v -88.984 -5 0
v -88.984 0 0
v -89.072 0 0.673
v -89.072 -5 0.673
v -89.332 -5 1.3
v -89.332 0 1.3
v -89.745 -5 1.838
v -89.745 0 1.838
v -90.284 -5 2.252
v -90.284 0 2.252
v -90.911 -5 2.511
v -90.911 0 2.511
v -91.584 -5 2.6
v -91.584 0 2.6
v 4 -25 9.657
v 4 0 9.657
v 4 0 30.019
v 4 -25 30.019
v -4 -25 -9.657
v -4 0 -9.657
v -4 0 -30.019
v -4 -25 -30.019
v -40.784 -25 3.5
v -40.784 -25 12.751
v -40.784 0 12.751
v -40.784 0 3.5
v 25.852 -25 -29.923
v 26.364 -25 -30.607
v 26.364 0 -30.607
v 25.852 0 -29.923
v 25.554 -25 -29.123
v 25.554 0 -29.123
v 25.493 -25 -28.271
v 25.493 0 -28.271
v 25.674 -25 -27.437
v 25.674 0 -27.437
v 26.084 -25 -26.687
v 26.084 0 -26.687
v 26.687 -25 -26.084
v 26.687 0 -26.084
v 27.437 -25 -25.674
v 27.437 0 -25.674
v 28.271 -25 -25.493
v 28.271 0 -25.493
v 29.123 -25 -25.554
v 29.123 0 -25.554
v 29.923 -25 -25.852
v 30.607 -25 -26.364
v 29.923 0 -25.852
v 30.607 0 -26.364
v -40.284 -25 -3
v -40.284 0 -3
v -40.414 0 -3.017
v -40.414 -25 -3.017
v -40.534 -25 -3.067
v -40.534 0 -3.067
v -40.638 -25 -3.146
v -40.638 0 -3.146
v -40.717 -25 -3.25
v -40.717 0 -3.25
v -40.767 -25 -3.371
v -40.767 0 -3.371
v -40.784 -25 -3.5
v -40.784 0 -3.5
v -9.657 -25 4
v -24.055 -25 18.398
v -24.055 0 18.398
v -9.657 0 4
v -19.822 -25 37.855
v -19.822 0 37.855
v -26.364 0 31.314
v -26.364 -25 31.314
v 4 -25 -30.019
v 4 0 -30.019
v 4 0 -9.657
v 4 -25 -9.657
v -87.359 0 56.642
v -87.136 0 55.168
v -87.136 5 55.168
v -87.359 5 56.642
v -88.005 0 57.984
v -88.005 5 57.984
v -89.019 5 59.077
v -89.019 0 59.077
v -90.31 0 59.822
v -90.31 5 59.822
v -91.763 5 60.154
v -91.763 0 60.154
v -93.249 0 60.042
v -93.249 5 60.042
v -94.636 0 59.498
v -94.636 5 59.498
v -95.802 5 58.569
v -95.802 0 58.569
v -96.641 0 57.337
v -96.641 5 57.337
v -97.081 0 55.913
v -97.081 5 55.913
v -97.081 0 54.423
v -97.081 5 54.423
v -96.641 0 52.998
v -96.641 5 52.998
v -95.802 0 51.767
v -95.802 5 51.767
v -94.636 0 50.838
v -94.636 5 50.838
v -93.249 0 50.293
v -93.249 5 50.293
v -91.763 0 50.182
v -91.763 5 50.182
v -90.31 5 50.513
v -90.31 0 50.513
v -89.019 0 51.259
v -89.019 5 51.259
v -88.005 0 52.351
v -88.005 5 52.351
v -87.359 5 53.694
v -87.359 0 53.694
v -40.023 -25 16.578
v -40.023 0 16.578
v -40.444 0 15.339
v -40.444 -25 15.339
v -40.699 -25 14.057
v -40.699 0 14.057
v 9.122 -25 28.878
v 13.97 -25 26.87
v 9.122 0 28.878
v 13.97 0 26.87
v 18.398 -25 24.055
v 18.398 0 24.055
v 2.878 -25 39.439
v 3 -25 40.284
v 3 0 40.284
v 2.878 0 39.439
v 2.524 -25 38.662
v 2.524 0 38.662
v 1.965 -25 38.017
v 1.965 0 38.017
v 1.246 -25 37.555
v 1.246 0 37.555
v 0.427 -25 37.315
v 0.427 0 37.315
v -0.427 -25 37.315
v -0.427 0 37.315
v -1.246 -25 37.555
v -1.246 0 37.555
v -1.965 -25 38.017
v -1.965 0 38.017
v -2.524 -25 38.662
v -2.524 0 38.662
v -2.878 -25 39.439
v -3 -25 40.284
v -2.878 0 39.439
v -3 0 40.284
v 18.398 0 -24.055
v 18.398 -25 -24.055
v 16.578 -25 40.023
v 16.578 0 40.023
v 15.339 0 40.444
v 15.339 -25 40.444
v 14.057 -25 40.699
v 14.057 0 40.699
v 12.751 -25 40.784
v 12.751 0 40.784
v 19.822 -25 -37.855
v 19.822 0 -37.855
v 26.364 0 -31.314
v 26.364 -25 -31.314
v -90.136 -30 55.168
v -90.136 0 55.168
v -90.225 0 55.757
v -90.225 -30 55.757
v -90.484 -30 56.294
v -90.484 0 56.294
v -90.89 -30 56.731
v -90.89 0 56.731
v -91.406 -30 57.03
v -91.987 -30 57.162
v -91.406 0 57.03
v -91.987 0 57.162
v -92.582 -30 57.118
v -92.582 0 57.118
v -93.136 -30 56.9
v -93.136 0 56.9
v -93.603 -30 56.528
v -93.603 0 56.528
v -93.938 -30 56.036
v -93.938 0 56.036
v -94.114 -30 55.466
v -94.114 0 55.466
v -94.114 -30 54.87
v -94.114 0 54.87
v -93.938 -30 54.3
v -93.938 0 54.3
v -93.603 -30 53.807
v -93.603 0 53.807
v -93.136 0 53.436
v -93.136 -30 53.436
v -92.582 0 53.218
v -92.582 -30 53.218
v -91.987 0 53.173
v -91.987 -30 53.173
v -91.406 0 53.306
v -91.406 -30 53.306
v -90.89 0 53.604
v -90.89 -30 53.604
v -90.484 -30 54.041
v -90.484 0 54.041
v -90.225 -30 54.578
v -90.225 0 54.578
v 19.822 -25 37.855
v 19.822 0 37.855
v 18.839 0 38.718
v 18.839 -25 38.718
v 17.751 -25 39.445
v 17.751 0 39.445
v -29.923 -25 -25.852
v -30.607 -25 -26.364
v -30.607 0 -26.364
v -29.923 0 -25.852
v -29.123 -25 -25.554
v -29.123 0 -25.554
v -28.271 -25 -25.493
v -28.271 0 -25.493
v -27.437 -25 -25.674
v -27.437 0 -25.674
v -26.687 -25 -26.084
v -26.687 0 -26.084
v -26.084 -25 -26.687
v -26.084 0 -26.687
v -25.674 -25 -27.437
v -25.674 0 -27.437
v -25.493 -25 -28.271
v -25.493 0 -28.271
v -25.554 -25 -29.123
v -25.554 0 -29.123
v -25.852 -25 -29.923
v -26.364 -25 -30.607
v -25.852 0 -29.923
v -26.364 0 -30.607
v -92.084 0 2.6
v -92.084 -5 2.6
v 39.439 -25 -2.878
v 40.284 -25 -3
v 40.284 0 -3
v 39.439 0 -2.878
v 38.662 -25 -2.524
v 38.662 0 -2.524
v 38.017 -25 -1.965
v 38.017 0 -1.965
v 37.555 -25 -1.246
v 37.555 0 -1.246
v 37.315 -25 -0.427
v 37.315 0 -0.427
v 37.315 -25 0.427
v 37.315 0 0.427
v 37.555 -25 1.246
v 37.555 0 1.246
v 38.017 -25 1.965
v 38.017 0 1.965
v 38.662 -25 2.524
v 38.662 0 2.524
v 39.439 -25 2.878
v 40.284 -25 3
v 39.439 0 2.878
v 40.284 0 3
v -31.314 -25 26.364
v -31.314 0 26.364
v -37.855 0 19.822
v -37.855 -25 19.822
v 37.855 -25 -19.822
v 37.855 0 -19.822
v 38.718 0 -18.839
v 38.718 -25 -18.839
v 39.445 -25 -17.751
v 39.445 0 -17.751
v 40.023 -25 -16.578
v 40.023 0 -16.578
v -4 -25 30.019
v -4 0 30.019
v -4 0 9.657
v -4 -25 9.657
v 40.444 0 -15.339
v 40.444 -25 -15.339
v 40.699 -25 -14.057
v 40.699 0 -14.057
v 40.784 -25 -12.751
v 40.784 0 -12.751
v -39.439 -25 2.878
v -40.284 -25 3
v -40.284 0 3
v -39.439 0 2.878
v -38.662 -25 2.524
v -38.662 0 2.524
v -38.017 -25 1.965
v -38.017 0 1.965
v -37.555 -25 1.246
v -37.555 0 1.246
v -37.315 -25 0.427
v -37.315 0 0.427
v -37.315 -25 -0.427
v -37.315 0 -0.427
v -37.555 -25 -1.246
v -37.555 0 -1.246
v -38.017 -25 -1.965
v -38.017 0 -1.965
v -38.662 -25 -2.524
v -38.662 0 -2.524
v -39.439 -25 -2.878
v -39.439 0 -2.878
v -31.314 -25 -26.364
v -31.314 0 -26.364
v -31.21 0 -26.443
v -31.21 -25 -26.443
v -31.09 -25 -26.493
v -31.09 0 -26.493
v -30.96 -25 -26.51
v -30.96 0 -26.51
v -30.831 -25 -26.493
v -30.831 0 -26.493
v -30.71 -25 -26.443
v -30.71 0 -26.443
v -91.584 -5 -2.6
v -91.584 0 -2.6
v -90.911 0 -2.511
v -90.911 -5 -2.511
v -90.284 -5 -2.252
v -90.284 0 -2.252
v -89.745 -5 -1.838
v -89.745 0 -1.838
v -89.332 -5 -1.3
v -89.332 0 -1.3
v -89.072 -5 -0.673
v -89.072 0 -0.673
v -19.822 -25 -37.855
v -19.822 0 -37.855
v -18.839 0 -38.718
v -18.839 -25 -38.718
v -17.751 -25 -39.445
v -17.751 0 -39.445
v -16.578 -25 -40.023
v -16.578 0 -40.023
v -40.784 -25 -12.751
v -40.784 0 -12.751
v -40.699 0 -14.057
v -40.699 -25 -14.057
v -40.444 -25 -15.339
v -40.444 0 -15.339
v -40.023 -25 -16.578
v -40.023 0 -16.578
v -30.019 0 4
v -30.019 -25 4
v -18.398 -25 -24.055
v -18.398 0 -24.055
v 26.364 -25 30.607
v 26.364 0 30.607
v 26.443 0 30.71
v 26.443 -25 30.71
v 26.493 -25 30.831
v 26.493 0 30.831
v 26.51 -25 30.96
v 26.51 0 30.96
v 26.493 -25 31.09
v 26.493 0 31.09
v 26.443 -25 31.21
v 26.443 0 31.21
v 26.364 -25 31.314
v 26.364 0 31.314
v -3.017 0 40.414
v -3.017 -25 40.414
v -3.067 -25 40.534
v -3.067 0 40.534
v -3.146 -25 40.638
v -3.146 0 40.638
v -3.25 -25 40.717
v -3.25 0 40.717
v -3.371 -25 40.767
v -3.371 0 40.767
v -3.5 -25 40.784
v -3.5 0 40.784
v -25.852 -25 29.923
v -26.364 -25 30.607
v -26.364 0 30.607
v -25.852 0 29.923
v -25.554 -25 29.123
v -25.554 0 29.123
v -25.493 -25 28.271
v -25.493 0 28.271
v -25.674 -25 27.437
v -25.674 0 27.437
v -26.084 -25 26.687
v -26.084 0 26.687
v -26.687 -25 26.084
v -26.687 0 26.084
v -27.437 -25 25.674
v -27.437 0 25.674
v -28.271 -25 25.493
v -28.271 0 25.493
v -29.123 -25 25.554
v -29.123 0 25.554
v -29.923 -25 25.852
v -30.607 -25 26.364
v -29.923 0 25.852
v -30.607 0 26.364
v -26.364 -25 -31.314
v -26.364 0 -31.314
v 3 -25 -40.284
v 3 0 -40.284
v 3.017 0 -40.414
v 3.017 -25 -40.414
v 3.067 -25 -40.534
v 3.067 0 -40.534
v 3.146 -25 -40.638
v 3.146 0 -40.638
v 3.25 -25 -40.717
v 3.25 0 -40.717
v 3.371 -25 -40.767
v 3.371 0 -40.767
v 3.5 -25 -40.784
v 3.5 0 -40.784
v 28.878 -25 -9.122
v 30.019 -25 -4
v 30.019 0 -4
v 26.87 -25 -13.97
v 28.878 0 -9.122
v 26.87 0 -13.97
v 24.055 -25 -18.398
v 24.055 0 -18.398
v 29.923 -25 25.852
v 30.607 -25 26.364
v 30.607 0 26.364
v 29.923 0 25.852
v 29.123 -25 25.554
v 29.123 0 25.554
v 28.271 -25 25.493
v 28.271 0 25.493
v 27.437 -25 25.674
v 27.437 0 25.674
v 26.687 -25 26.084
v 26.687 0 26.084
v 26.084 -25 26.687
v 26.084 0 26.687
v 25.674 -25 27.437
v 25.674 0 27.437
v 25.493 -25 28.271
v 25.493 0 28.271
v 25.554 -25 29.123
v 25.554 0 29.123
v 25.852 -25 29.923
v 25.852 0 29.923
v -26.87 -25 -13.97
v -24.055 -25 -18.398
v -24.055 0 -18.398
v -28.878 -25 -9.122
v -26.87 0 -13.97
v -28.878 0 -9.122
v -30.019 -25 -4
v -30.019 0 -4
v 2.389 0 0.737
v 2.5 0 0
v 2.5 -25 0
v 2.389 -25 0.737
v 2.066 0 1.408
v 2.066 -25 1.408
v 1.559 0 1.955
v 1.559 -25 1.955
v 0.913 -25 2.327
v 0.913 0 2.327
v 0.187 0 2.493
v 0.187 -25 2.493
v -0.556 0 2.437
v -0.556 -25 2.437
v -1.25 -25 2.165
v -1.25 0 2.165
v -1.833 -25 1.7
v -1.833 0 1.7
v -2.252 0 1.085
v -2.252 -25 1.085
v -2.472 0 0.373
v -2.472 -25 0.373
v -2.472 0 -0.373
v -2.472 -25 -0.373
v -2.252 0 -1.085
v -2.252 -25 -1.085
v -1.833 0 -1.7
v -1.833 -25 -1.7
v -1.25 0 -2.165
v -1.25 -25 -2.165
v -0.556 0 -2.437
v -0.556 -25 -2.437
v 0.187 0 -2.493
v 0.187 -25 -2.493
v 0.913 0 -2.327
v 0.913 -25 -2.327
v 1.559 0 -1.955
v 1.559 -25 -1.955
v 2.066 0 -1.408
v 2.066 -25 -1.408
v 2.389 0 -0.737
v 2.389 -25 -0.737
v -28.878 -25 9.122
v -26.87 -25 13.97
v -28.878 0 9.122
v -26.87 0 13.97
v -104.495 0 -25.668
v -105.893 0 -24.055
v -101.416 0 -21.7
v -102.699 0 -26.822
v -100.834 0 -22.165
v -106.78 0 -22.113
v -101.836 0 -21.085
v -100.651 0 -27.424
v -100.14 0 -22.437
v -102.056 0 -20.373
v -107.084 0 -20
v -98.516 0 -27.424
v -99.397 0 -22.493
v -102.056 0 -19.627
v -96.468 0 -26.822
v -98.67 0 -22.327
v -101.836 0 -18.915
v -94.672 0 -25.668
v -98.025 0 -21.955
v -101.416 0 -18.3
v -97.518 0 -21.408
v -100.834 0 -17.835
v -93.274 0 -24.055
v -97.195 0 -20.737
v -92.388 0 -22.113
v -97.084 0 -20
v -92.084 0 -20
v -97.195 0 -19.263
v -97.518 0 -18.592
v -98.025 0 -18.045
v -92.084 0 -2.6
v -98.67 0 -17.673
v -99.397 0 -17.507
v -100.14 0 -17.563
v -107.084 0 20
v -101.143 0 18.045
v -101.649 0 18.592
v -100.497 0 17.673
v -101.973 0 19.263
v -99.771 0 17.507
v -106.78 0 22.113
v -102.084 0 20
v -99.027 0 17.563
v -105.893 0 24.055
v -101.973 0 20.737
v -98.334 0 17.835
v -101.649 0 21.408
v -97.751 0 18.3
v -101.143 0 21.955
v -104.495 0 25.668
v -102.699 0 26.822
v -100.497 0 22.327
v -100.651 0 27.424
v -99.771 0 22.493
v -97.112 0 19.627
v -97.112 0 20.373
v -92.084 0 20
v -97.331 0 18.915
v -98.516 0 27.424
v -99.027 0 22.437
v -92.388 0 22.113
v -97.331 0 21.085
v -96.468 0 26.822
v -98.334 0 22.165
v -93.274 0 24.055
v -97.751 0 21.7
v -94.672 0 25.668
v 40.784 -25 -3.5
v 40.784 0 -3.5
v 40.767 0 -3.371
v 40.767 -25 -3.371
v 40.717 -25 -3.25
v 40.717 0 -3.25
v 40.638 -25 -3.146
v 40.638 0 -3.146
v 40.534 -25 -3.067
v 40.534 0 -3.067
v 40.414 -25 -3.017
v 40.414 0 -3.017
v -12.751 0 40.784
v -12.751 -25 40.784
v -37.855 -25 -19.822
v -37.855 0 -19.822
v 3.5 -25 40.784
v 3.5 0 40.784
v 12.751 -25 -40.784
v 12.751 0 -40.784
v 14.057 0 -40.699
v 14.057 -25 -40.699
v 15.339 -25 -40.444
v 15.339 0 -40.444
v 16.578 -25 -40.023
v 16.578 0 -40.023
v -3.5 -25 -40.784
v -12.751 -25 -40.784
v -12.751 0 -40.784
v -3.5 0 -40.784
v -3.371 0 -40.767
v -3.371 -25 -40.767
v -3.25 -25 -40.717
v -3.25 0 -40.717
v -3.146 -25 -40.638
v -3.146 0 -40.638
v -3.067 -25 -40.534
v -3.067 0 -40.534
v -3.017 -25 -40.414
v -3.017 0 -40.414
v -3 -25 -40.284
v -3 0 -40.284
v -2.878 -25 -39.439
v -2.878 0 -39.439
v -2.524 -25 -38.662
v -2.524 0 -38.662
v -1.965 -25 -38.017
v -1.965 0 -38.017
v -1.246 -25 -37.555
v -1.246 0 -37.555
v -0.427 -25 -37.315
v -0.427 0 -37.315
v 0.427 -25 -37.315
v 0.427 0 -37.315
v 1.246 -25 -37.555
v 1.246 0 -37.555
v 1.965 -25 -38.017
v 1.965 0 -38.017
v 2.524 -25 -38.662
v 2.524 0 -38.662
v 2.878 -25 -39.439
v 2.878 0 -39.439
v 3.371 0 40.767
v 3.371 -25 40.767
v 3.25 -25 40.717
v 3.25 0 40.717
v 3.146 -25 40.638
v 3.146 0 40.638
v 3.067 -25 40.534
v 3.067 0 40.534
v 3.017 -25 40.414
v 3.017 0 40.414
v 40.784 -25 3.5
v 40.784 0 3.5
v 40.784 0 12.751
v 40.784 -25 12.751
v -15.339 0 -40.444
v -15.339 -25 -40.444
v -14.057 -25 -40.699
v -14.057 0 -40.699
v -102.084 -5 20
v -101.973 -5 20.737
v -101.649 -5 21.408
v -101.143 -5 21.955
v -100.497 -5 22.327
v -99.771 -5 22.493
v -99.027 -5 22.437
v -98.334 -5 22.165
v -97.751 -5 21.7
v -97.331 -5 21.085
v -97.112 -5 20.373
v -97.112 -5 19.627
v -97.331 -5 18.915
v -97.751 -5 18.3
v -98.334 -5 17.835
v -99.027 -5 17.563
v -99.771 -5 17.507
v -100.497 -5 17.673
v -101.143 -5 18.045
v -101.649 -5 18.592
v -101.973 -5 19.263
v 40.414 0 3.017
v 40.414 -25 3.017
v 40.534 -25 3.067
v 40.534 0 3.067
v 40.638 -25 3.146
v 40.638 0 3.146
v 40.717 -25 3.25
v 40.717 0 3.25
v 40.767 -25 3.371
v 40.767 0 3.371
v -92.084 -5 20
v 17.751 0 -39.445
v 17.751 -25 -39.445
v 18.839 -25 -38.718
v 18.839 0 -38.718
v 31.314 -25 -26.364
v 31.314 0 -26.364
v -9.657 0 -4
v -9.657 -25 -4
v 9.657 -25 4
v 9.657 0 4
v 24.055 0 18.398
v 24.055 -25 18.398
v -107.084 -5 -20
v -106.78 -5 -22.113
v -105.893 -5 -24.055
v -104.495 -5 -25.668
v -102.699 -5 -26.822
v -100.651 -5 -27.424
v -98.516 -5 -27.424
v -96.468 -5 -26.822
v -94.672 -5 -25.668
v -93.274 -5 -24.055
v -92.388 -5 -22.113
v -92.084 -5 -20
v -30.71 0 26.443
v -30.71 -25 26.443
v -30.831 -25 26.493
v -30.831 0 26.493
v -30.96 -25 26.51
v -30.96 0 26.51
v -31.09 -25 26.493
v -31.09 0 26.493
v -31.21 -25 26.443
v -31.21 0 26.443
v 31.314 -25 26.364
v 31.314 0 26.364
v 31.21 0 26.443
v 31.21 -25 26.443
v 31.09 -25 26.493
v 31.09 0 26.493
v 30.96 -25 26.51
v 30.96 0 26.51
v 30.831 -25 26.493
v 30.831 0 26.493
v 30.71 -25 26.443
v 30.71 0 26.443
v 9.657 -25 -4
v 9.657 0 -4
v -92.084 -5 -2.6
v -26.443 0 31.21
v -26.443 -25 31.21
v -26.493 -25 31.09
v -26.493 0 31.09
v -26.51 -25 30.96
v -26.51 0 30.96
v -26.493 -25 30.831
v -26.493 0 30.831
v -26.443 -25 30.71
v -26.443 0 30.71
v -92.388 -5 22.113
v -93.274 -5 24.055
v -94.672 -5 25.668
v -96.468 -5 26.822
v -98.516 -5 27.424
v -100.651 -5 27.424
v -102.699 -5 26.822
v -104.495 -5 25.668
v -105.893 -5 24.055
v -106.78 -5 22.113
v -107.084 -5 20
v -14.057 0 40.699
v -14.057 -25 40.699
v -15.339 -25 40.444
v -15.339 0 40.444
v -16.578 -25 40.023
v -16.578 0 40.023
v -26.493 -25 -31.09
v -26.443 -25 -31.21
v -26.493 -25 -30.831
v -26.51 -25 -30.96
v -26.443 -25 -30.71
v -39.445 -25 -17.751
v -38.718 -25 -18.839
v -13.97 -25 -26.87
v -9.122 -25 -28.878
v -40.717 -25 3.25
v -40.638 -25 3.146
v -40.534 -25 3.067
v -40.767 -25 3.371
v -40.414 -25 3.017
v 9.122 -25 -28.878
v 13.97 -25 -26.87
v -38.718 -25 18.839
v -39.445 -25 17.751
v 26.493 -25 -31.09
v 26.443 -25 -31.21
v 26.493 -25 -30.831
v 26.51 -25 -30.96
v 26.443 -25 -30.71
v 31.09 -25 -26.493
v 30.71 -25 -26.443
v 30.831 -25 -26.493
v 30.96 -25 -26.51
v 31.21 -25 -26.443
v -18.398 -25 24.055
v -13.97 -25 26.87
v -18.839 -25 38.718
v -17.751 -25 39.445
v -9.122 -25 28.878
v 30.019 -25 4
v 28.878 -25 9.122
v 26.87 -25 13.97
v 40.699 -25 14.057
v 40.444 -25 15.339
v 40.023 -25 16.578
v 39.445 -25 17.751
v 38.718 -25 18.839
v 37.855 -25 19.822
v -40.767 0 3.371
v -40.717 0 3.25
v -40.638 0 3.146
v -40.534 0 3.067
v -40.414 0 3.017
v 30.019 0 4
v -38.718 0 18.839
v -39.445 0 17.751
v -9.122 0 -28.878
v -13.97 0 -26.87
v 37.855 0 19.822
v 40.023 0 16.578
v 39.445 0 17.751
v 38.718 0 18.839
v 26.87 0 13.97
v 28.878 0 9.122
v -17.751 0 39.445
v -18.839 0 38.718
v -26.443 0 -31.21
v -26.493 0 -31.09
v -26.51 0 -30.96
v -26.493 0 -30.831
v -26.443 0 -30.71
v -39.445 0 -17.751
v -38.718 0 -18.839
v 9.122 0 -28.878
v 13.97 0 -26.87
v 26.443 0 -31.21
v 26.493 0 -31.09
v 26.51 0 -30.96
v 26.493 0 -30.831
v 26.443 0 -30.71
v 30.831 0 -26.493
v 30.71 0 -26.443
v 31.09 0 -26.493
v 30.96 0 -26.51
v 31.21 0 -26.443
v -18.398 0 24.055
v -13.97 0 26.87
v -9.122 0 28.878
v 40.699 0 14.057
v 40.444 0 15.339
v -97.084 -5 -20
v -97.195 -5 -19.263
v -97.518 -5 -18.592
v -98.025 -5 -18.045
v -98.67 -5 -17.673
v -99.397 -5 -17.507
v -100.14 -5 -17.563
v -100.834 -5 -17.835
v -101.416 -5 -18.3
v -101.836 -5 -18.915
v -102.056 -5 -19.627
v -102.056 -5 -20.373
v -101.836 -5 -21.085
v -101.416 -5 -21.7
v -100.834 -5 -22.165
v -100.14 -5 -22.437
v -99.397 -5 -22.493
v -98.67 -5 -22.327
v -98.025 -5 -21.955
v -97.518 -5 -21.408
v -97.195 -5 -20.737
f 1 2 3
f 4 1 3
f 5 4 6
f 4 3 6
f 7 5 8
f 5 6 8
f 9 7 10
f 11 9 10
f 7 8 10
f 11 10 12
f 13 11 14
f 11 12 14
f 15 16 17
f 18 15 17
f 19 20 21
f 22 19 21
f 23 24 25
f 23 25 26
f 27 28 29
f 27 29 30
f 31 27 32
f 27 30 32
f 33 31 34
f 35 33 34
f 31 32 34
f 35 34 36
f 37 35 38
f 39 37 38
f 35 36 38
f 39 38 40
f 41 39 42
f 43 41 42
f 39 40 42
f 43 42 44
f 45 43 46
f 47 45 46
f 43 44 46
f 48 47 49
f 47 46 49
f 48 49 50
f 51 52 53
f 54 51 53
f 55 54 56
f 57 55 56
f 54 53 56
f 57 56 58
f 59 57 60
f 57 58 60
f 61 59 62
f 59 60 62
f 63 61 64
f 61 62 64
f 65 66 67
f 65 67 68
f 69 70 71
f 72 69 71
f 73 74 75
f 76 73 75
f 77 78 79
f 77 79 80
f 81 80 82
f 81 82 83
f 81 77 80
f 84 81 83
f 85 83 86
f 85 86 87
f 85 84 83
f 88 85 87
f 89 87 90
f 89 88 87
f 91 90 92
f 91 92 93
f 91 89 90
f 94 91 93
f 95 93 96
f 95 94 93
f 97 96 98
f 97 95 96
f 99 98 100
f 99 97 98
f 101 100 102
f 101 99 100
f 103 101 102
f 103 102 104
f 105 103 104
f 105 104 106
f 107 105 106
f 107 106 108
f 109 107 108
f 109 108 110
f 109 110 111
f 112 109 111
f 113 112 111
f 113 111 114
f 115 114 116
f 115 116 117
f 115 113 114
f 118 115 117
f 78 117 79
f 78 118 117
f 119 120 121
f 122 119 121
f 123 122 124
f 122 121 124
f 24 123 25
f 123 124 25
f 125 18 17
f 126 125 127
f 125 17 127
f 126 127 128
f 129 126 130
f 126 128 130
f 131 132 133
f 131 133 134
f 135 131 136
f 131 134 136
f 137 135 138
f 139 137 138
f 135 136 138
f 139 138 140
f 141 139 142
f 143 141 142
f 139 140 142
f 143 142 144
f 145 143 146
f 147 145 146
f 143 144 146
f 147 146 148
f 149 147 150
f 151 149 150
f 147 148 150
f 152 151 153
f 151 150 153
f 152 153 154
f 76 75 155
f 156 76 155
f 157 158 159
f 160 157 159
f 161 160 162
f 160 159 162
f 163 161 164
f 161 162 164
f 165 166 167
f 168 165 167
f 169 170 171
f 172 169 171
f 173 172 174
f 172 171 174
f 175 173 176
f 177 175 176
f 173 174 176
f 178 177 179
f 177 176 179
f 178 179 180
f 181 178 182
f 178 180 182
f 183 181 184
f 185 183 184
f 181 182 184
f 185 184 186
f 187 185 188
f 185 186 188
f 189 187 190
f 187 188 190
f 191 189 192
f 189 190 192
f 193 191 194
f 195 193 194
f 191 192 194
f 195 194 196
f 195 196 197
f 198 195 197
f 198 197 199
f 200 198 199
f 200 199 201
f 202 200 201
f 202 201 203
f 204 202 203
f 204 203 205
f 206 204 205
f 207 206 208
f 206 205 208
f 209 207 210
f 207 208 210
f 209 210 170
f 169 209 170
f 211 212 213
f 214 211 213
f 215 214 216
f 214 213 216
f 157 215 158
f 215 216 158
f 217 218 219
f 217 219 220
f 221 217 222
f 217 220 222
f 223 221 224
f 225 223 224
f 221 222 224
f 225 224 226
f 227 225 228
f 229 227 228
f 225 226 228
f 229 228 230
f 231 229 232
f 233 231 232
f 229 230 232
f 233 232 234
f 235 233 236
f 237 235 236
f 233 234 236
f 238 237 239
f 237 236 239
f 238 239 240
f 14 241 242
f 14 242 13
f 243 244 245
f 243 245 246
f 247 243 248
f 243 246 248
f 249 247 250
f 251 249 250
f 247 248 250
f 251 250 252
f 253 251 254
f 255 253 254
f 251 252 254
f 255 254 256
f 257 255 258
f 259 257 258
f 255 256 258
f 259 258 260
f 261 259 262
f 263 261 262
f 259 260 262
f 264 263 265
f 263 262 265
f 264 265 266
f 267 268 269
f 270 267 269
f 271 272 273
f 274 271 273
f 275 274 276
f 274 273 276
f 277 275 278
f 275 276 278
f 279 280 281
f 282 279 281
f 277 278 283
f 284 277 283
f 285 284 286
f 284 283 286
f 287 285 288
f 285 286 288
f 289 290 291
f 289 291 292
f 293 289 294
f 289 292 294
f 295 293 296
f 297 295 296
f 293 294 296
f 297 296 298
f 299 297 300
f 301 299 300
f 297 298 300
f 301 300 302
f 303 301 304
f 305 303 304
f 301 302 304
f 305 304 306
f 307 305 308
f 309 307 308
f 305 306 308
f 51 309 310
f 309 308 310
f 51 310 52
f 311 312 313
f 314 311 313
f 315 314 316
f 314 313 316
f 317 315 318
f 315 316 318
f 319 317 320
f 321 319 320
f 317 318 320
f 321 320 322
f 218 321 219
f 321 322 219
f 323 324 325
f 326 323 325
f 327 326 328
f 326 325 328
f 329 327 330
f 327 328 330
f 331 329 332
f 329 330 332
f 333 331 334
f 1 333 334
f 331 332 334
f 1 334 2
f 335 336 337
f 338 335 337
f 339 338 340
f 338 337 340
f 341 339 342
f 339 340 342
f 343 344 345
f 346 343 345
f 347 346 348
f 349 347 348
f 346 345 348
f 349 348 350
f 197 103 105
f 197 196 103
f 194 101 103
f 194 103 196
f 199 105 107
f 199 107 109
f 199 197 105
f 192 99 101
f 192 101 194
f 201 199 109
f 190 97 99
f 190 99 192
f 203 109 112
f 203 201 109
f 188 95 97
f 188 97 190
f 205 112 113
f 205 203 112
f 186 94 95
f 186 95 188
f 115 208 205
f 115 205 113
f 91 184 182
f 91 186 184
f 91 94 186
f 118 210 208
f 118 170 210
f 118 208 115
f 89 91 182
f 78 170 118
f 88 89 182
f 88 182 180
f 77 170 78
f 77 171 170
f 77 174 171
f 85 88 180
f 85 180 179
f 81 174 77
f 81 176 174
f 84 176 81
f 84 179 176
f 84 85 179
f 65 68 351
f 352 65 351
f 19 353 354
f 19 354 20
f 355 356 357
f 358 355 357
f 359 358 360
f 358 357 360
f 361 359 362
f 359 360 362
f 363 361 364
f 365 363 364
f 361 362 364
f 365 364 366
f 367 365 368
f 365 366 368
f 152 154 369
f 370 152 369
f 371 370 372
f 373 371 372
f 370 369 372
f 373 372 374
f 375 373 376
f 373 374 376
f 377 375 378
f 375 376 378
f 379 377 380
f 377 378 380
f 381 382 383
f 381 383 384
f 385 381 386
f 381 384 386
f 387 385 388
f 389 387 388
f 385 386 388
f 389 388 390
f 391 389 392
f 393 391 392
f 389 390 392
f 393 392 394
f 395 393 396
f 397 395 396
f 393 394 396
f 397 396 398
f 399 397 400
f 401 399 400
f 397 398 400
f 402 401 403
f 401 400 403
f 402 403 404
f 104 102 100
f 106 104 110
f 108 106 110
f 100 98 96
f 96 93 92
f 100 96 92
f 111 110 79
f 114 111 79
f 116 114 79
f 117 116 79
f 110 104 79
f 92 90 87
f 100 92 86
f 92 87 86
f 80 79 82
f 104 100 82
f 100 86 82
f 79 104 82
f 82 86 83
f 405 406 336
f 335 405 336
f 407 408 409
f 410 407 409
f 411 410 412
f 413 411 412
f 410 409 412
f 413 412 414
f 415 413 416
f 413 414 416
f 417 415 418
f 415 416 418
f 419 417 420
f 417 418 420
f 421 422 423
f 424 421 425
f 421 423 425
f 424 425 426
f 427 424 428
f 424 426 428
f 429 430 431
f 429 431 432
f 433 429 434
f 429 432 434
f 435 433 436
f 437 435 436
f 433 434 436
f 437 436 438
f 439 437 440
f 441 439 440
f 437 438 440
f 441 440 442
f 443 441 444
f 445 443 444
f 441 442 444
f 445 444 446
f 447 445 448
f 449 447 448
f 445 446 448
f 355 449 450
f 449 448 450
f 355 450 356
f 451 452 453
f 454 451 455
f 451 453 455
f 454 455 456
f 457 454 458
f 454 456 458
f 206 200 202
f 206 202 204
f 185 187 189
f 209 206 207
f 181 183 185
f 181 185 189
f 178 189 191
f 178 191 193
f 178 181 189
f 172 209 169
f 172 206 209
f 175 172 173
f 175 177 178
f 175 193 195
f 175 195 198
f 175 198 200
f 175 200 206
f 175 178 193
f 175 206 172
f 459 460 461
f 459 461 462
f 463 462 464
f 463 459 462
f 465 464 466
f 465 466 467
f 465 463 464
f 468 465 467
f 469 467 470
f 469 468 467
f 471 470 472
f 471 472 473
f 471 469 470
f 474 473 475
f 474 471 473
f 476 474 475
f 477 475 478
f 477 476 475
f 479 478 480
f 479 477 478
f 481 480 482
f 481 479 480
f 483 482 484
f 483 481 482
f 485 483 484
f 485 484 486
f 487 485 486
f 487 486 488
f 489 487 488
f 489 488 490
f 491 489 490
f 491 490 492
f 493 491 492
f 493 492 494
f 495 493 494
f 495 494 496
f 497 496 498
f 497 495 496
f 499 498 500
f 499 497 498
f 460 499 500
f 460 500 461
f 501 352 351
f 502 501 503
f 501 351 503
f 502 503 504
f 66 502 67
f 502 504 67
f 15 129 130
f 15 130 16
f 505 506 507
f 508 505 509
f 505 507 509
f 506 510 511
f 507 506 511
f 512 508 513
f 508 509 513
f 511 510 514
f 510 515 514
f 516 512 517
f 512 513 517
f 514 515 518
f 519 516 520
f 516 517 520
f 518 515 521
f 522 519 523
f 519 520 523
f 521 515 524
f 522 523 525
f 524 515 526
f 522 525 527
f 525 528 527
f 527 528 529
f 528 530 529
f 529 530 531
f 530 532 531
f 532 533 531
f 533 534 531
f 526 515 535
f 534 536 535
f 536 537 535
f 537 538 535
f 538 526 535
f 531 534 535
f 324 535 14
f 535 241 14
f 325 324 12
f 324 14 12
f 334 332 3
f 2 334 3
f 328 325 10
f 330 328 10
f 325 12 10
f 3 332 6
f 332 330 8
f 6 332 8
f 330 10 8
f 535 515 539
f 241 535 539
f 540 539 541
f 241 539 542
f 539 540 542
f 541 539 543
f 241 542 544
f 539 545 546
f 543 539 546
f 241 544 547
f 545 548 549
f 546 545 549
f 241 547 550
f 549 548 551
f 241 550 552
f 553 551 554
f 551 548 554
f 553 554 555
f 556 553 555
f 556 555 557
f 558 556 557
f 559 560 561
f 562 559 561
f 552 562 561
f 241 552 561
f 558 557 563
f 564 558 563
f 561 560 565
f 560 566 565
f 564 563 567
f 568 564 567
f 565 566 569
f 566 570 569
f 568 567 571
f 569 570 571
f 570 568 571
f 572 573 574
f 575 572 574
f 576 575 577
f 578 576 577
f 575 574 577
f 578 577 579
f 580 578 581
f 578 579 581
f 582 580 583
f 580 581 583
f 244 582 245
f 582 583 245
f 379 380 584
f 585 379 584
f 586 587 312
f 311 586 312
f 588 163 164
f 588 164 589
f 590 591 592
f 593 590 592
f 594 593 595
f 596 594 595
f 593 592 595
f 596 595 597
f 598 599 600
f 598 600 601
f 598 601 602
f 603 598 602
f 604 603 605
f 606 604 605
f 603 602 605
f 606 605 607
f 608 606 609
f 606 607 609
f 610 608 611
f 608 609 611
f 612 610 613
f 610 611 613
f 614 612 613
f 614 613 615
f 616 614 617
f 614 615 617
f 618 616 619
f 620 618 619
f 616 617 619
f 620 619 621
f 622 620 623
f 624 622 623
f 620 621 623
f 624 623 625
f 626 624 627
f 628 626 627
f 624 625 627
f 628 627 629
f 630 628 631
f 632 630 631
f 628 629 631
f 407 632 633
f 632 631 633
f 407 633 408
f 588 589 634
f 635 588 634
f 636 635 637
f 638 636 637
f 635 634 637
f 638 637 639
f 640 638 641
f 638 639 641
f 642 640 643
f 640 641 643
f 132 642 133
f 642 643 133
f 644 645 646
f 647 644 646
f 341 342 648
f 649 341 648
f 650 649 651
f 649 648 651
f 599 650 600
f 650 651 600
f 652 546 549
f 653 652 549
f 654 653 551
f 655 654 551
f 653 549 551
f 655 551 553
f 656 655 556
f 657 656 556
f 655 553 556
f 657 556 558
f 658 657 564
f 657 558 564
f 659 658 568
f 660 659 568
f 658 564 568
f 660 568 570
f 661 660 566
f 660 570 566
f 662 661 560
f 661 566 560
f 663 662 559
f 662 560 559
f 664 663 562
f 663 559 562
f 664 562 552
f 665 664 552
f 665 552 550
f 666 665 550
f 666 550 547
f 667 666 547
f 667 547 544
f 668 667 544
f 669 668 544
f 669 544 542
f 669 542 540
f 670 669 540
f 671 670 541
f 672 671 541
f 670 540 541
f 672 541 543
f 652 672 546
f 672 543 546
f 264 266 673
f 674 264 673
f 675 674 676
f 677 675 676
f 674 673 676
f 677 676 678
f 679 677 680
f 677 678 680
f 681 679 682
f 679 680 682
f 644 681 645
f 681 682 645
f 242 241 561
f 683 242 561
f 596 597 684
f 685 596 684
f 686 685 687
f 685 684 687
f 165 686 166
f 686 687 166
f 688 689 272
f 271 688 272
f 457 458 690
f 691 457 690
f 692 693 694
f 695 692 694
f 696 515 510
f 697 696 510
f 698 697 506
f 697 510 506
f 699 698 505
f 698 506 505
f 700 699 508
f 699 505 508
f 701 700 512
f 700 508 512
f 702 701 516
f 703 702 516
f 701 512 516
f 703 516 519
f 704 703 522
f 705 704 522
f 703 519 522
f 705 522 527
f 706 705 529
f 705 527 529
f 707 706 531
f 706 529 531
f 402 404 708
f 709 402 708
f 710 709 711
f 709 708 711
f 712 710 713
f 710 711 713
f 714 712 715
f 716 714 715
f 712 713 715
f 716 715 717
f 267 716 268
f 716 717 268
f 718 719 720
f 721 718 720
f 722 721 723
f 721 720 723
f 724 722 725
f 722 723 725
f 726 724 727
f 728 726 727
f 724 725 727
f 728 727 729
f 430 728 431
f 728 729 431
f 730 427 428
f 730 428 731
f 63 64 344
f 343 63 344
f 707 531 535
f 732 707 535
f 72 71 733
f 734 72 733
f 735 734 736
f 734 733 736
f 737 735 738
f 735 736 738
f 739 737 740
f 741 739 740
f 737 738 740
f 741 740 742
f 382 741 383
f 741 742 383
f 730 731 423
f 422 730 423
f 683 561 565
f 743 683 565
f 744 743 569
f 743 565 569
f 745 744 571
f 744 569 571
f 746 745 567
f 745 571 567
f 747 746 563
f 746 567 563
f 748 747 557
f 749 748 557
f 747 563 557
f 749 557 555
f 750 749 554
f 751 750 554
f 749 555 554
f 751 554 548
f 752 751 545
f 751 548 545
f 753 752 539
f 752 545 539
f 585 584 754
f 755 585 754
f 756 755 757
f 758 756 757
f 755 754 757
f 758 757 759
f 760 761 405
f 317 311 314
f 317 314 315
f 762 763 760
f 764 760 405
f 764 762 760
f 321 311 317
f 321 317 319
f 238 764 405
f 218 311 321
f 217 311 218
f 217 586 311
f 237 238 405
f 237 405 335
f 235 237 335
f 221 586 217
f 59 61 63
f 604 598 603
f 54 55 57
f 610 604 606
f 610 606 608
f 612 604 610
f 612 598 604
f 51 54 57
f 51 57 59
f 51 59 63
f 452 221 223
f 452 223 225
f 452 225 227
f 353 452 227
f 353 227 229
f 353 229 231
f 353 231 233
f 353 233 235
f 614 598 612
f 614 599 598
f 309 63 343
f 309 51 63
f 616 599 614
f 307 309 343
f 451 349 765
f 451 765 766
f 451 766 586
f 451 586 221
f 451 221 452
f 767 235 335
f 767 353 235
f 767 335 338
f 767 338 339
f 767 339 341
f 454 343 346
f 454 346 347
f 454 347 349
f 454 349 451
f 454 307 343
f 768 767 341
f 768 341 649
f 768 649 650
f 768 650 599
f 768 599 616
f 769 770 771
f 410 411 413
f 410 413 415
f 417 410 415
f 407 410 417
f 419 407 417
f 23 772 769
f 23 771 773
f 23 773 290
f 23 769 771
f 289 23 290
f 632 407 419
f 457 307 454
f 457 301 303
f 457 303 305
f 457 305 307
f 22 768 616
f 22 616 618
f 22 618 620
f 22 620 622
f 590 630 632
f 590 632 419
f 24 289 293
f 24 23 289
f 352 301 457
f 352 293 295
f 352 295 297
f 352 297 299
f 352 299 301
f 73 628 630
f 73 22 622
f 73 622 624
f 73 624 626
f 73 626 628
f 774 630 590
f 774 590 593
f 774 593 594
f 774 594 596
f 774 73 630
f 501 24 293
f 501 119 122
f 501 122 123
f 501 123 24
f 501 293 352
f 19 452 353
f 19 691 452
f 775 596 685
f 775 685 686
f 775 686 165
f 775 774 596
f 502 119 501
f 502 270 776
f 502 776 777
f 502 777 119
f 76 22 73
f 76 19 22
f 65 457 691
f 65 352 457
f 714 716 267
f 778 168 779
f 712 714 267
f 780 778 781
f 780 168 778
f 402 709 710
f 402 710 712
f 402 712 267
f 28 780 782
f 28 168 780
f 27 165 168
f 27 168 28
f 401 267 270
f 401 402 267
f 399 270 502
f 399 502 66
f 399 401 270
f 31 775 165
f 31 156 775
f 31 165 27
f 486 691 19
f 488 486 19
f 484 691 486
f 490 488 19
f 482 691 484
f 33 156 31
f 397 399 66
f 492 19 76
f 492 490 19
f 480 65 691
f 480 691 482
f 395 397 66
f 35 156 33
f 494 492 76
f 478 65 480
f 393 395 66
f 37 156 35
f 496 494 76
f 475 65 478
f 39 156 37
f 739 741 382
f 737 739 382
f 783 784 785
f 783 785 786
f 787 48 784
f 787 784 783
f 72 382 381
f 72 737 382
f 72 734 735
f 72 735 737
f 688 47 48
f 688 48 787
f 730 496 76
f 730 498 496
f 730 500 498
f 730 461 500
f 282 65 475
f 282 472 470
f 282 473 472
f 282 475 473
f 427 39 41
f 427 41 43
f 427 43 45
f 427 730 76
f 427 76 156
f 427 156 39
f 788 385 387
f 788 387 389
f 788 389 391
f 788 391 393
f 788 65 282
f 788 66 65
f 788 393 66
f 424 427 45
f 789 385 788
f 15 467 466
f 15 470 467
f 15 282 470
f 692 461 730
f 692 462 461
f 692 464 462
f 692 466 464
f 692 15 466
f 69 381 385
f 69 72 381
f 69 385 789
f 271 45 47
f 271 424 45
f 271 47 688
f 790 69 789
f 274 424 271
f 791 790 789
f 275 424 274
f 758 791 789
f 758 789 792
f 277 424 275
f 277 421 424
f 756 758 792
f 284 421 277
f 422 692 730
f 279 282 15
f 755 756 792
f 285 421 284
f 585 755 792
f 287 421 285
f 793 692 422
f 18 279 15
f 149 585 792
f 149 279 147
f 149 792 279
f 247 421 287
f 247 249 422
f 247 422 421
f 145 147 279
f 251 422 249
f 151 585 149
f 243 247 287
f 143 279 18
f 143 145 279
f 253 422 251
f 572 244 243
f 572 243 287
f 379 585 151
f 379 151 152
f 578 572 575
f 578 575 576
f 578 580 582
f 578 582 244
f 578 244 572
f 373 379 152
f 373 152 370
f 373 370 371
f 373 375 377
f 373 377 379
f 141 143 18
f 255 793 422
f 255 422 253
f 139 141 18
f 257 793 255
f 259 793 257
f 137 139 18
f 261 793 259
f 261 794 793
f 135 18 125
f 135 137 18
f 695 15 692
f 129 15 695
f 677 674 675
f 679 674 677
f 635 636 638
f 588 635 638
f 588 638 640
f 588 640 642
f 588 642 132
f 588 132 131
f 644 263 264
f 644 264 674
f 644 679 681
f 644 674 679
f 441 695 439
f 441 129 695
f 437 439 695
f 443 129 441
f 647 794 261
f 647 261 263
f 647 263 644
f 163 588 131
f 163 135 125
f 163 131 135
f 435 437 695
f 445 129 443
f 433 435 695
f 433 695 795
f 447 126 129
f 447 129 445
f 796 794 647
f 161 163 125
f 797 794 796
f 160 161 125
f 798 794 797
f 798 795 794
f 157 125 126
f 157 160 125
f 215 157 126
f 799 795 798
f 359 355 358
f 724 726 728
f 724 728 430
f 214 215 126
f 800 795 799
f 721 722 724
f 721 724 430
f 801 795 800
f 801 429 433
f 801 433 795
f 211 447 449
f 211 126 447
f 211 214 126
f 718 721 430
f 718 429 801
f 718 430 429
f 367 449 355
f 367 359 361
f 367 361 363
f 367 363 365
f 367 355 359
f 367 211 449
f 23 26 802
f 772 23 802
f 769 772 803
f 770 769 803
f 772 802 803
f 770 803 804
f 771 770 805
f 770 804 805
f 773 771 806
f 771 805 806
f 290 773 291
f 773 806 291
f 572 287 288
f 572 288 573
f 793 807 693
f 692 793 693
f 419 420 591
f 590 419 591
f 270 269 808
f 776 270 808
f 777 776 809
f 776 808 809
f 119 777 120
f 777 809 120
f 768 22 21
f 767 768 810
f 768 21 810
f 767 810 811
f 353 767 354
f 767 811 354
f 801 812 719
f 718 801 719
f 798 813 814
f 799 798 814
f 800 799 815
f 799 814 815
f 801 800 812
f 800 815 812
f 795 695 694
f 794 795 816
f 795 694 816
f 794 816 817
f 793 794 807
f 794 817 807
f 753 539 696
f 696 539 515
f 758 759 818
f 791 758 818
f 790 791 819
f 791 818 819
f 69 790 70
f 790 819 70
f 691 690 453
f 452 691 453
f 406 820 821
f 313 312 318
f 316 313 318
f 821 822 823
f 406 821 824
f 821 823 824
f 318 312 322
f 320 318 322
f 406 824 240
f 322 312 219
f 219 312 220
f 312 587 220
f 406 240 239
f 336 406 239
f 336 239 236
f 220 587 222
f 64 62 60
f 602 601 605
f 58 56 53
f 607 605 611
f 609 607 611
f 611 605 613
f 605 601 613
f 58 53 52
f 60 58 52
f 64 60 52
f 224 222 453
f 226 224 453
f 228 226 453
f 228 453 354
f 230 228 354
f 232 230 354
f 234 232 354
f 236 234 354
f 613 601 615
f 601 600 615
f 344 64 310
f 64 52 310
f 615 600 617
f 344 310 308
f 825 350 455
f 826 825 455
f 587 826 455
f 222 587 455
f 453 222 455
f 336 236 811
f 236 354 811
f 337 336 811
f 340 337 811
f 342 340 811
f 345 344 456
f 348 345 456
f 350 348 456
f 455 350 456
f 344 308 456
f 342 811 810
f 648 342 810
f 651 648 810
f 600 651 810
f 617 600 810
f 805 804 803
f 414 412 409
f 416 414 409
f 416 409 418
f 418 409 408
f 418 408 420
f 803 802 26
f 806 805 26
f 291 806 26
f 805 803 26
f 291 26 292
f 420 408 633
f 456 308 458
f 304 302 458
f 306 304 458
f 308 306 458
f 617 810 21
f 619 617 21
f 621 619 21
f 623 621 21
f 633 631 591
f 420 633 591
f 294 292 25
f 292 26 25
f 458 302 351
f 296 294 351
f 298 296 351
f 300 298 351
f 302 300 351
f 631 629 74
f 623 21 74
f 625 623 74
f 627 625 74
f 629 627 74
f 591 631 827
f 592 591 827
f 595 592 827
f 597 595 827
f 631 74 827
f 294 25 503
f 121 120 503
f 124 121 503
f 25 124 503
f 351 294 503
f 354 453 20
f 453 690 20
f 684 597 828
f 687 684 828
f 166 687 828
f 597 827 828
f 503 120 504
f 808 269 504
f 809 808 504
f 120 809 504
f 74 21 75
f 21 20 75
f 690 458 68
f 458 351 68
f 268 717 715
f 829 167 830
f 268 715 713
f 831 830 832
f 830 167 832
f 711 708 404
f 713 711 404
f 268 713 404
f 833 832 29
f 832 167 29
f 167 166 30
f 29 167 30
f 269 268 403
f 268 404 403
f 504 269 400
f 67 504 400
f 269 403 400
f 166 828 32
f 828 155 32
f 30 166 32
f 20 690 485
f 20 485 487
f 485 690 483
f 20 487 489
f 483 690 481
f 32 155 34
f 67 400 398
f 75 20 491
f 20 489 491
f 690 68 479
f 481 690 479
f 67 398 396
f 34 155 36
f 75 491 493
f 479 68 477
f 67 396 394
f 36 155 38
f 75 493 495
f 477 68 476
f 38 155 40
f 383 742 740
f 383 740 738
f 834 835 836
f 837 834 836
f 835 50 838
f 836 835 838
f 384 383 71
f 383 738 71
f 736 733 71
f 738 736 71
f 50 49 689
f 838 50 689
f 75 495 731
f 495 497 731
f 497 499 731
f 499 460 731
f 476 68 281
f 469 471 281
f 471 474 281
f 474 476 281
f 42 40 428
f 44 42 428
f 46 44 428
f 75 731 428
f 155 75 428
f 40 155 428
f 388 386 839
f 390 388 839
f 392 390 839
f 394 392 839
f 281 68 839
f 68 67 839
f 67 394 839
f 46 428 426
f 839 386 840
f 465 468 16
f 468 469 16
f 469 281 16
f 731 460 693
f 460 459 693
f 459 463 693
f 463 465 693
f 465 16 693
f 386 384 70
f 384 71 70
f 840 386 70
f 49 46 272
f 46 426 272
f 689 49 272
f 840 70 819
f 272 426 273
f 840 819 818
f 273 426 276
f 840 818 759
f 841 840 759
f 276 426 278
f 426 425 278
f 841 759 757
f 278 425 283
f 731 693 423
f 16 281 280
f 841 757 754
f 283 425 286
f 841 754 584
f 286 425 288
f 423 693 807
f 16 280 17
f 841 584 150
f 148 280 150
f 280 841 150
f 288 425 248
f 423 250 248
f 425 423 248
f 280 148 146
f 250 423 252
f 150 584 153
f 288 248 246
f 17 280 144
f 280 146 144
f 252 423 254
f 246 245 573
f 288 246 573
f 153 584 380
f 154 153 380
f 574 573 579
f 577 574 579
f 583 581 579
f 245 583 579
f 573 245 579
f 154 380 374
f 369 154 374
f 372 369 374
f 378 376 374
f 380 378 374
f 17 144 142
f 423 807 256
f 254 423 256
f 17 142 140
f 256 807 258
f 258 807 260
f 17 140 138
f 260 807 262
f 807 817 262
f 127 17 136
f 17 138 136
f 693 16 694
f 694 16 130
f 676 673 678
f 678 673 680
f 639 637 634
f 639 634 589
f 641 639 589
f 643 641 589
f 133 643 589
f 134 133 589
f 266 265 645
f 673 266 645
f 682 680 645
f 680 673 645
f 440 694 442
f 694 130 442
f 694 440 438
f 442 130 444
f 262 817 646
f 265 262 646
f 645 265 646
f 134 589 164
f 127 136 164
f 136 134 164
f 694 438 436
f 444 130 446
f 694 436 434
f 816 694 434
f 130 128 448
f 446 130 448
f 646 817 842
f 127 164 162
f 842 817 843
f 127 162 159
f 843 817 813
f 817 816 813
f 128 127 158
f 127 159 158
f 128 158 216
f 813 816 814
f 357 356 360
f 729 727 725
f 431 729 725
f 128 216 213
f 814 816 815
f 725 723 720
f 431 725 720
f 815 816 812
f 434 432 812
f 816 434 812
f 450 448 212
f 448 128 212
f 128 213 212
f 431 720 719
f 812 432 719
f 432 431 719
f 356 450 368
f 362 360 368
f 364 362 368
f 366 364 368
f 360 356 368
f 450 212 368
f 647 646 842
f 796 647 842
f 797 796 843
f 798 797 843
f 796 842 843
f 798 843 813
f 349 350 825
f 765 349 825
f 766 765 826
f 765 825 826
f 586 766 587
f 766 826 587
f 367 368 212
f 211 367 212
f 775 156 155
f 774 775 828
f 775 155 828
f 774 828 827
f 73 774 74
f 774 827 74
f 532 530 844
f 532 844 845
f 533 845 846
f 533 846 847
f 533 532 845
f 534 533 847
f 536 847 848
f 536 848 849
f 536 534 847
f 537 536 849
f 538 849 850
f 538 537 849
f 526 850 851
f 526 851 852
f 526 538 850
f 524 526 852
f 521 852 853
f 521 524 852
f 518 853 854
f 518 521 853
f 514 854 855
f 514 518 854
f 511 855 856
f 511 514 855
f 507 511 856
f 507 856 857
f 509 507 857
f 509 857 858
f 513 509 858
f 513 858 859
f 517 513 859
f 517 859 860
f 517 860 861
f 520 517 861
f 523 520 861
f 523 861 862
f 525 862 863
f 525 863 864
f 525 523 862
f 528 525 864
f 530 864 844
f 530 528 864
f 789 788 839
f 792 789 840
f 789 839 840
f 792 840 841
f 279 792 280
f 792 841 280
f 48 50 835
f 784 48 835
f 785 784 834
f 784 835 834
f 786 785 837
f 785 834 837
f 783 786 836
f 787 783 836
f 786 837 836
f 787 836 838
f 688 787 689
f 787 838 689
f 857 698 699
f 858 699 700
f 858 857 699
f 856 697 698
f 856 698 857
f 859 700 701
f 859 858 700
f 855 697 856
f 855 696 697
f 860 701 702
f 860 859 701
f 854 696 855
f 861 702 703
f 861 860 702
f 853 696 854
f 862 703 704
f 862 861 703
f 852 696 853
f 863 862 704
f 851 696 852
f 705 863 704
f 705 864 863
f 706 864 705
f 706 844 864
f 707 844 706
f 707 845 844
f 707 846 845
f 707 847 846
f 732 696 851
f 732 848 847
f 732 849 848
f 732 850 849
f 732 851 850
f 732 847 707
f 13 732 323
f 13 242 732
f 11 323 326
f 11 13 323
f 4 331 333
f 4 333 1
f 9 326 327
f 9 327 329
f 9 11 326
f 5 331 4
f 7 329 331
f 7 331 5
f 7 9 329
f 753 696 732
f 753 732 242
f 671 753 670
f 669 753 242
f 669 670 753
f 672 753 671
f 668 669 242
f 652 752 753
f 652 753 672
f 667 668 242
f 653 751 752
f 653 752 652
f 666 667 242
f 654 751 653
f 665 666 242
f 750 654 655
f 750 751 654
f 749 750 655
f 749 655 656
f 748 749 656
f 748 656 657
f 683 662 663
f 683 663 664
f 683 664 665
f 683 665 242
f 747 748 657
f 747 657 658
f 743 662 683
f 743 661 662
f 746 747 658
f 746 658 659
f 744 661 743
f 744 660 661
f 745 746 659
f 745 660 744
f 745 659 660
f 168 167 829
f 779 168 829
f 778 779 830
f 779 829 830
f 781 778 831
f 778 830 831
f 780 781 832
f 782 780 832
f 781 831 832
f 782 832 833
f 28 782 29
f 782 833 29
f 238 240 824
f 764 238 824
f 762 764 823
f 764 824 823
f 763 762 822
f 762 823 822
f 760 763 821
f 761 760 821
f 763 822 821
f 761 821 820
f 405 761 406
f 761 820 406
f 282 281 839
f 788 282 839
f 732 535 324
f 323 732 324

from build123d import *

# Parameters (mm, degrees)
F0_W     = 0.5
F0_H     = 2.6
F0_R     = 2.5
F1_DEPTH = 5
F2_DEPTH = 25
F0_R_2   = 2
F3_DEPTH = 30
F0_R_3   = 5
F4_DEPTH = 5


with BuildPart() as f1:
    # F0 (on Front) → F1 (new body)
    with BuildSketch(Plane.XZ):
        with BuildLine():
            Line((-92.0837859809, 2.6), (-92.0837859809, 20))
            ThreePointArc((-92.0837859809, 20), (-99.5837859809, 12.5), (-107.0837859809, 20))
            Line((-107.0837859809, 20), (-107.0837859809, 0))
            Line((-107.0837859809, 0), (-92.0837859809, 0))
            Line((-92.0837859809, 0), (-92.0837859809, 2.6))
        make_face()
        with BuildLine():
            Line((-92.0837859809, -2.6), (-92.0837859809, 0))
            Line((-92.0837859809, 0), (-107.0837859809, 0))
            Line((-107.0837859809, 0), (-107.0837859809, -20))
            ThreePointArc((-107.0837859809, -20), (-99.5837859809, -12.5), (-92.0837859809, -20))
            Line((-92.0837859809, -20), (-92.0837859809, -2.6))
        make_face()
        with BuildLine():
            Line((-92.0837859809, 20), (-97.0837859809, 20))
            ThreePointArc((-97.0837859809, 20), (-99.5837859809, 17.5), (-102.0837859809, 20))
            Line((-102.0837859809, 20), (-107.0837859809, 20))
            ThreePointArc((-107.0837859809, 20), (-99.5837859809, 12.5), (-92.0837859809, 20))
        make_face()
        with BuildLine():
            ThreePointArc((-102.0837859809, 20), (-99.5837859809, 22.5), (-97.0837859809, 20))
            Line((-97.0837859809, 20), (-92.0837859809, 20))
            ThreePointArc((-92.0837859809, 20), (-99.5837859809, 27.5), (-107.0837859809, 20))
            Line((-107.0837859809, 20), (-102.0837859809, 20))
        make_face()
        with BuildLine():
            Line((-91.5837859809, 0), (-92.0837859809, 0))
            Line((-92.0837859809, 0), (-92.0837859809, -2.6))
            Line((-92.0837859809, -2.6), (-91.5837859809, -2.6))
            ThreePointArc((-91.5837859809, -2.6), (-89.7453083499, -1.8384776311), (-88.9837859809, 0))
            ThreePointArc((-88.9837859809, 0), (-89.7453083499, 1.8384776311), (-91.5837859809, 2.6))
            Line((-91.5837859809, 2.6), (-91.5837859809, 0))
        make_face()
        with Locations((-91.8337859809, 1.3)):
            Rectangle(F0_W, F0_H)
        with BuildLine():
            ThreePointArc((-92.0837859809, -20), (-99.5837859809, -12.5), (-107.0837859809, -20))
            ThreePointArc((-107.0837859809, -20), (-99.5837859809, -27.5), (-92.0837859809, -20))
        make_face()
        with Locations((-99.5837859809, -20)):
            Circle(F0_R, mode=Mode.SUBTRACT)
    extrude(amount=F1_DEPTH)


with BuildPart() as f2:
    # F0 (on Front) → F2 (new body)
    with BuildSketch(Plane.XZ):
        with BuildLine():
            Line((40.7842712475, -12.7512626585), (40.7842712475, -3.5))
            ThreePointArc((40.7842712475, -3.5), (40.6378246381, -3.1464466094), (40.2842712475, -3))
            ThreePointArc((40.2842712475, -3), (37.2842712475, 0), (40.2842712475, 3))
            ThreePointArc((40.2842712475, 3), (40.6378246381, 3.1464466094), (40.7842712475, 3.5))
            Line((40.7842712475, 3.5), (40.7842712475, 12.7512626585))
            ThreePointArc((40.7842712475, 12.7512626585), (40.5921240515, 14.7021658786), (40.0230665726, 16.5780969821))
            ThreePointArc((40.0230665726, 16.5780969821), (39.0989673705, 18.3069649887), (37.8553390593, 19.8223304703))
            Line((37.8553390593, 19.8223304703), (31.313708499, 26.3639610307))
            ThreePointArc((31.313708499, 26.3639610307), (30.9601551084, 26.5104076401), (30.6066017178, 26.3639610307))
            ThreePointArc((30.6066017178, 26.3639610307), (26.3639610307, 26.3639610307), (26.3639610307, 30.6066017178))
            ThreePointArc((26.3639610307, 30.6066017178), (26.5104076401, 30.9601551084), (26.3639610307, 31.313708499))
            Line((26.3639610307, 31.313708499), (19.8223304703, 37.8553390593))
            ThreePointArc((19.8223304703, 37.8553390593), (18.3069649887, 39.0989673705), (16.5780969821, 40.0230665726))
            ThreePointArc((16.5780969821, 40.0230665726), (14.7021658786, 40.5921240515), (12.7512626585, 40.7842712475))
            Line((12.7512626585, 40.7842712475), (3.5, 40.7842712475))
            ThreePointArc((3.5, 40.7842712475), (3.1464466094, 40.6378246381), (3, 40.2842712475))
            ThreePointArc((3, 40.2842712475), (0, 37.2842712475), (-3, 40.2842712475))
            ThreePointArc((-3, 40.2842712475), (-3.1464466094, 40.6378246381), (-3.5, 40.7842712475))
            Line((-3.5, 40.7842712475), (-12.7512626585, 40.7842712475))
            ThreePointArc((-12.7512626585, 40.7842712475), (-14.7021658786, 40.5921240515), (-16.5780969821, 40.0230665726))
            ThreePointArc((-16.5780969821, 40.0230665726), (-18.3069649887, 39.0989673705), (-19.8223304703, 37.8553390593))
            Line((-19.8223304703, 37.8553390593), (-26.3639610307, 31.313708499))
            ThreePointArc((-26.3639610307, 31.313708499), (-26.5104076401, 30.9601551084), (-26.3639610307, 30.6066017178))
            ThreePointArc((-26.3639610307, 30.6066017178), (-26.3639610307, 26.3639610307), (-30.6066017178, 26.3639610307))
            ThreePointArc((-30.6066017178, 26.3639610307), (-30.9601551084, 26.5104076401), (-31.313708499, 26.3639610307))
            Line((-31.313708499, 26.3639610307), (-37.8553390593, 19.8223304703))
            ThreePointArc((-37.8553390593, 19.8223304703), (-39.0989673705, 18.3069649887), (-40.0230665726, 16.5780969821))
            ThreePointArc((-40.0230665726, 16.5780969821), (-40.5921240515, 14.7021658786), (-40.7842712475, 12.7512626585))
            Line((-40.7842712475, 12.7512626585), (-40.7842712475, 3.5))
            ThreePointArc((-40.7842712475, 3.5), (-40.6378246381, 3.1464466094), (-40.2842712475, 3))
            ThreePointArc((-40.2842712475, 3), (-37.2842712475, 0), (-40.2842712475, -3))
            ThreePointArc((-40.2842712475, -3), (-40.6378246381, -3.1464466094), (-40.7842712475, -3.5))
            Line((-40.7842712475, -3.5), (-40.7842712475, -12.7512626585))
            ThreePointArc((-40.7842712475, -12.7512626585), (-40.5921240515, -14.7021658786), (-40.0230665726, -16.5780969821))
            ThreePointArc((-40.0230665726, -16.5780969821), (-39.0989673705, -18.3069649887), (-37.8553390593, -19.8223304703))
            Line((-37.8553390593, -19.8223304703), (-31.313708499, -26.3639610307))
            ThreePointArc((-31.313708499, -26.3639610307), (-30.9601551084, -26.5104076401), (-30.6066017178, -26.3639610307))
            ThreePointArc((-30.6066017178, -26.3639610307), (-26.3639610307, -26.3639610307), (-26.3639610307, -30.6066017178))
            ThreePointArc((-26.3639610307, -30.6066017178), (-26.5104076401, -30.9601551084), (-26.3639610307, -31.313708499))
            Line((-26.3639610307, -31.313708499), (-19.8223304703, -37.8553390593))
            ThreePointArc((-19.8223304703, -37.8553390593), (-18.3069649887, -39.0989673705), (-16.5780969821, -40.0230665726))
            ThreePointArc((-16.5780969821, -40.0230665726), (-14.7021658786, -40.5921240515), (-12.7512626585, -40.7842712475))
            Line((-12.7512626585, -40.7842712475), (-3.5, -40.7842712475))
            ThreePointArc((-3.5, -40.7842712475), (-3.1464466094, -40.6378246381), (-3, -40.2842712475))
            ThreePointArc((-3, -40.2842712475), (0, -37.2842712475), (3, -40.2842712475))
            ThreePointArc((3, -40.2842712475), (3.1464466094, -40.6378246381), (3.5, -40.7842712475))
            Line((3.5, -40.7842712475), (12.7512626585, -40.7842712475))
            ThreePointArc((12.7512626585, -40.7842712475), (14.7021658786, -40.5921240515), (16.5780969821, -40.0230665726))
            ThreePointArc((16.5780969821, -40.0230665726), (18.3069649887, -39.0989673705), (19.8223304703, -37.8553390593))
            Line((19.8223304703, -37.8553390593), (26.3639610307, -31.313708499))
            ThreePointArc((26.3639610307, -31.313708499), (26.5104076401, -30.9601551084), (26.3639610307, -30.6066017178))
            ThreePointArc((26.3639610307, -30.6066017178), (26.3639610307, -26.3639610307), (30.6066017178, -26.3639610307))
            ThreePointArc((30.6066017178, -26.3639610307), (30.9601551084, -26.5104076401), (31.313708499, -26.3639610307))
            Line((31.313708499, -26.3639610307), (37.8553390593, -19.8223304703))
            ThreePointArc((37.8553390593, -19.8223304703), (39.0989673705, -18.3069649887), (40.0230665726, -16.5780969821))
            ThreePointArc((40.0230665726, -16.5780969821), (40.5921240515, -14.7021658786), (40.7842712475, -12.7512626585))
        make_face()
        with BuildLine():
            ThreePointArc((30.0189454343, 4), (30.2178669919, 2.0043950326), (30.2842712475, 0))
            ThreePointArc((30.2842712475, 0), (30.2178669919, -2.0043950326), (30.0189454343, -4))
            ThreePointArc((30.0189454343, -4), (27.9790183626, -11.5892888677), (24.0550270054, -18.3981727559))
            ThreePointArc((24.0550270054, -18.3981727559), (21.4142135624, -21.4142135624), (18.3981727559, -24.0550270054))
            ThreePointArc((18.3981727559, -24.0550270054), (11.5892888677, -27.9790183626), (4, -30.0189454343))
            ThreePointArc((4, -30.0189454343), (0, -30.2842712475), (-4, -30.0189454343))
            ThreePointArc((-4, -30.0189454343), (-11.5892888677, -27.9790183626), (-18.3981727559, -24.0550270054))
            ThreePointArc((-18.3981727559, -24.0550270054), (-21.4142135624, -21.4142135624), (-24.0550270054, -18.3981727559))
            ThreePointArc((-24.0550270054, -18.3981727559), (-27.9790183626, -11.5892888677), (-30.0189454343, -4))
            ThreePointArc((-30.0189454343, -4), (-30.2842712475, 0), (-30.0189454343, 4))
            ThreePointArc((-30.0189454343, 4), (-27.9790183626, 11.5892888677), (-24.0550270054, 18.3981727559))
            ThreePointArc((-24.0550270054, 18.3981727559), (-21.4142135624, 21.4142135624), (-18.3981727559, 24.0550270054))
            ThreePointArc((-18.3981727559, 24.0550270054), (-11.5892888677, 27.9790183626), (-4, 30.0189454343))
            ThreePointArc((-4, 30.0189454343), (0, 30.2842712475), (4, 30.0189454343))
            ThreePointArc((4, 30.0189454343), (11.5892888677, 27.9790183626), (18.3981727559, 24.0550270054))
            ThreePointArc((18.3981727559, 24.0550270054), (21.4142135624, 21.4142135624), (24.0550270054, 18.3981727559))
            ThreePointArc((24.0550270054, 18.3981727559), (27.9790183626, 11.5892888677), (30.0189454343, 4))
        make_face(mode=Mode.SUBTRACT)
        with BuildLine():
            ThreePointArc((30.0189454343, -4), (30.2178669919, -2.0043950326), (30.2842712475, 0))
            ThreePointArc((30.2842712475, 0), (30.2178669919, 2.0043950326), (30.0189454343, 4))
            Line((30.0189454343, 4), (9.6568542495, 4))
            Line((9.6568542495, 4), (24.0550270054, 18.3981727559))
            ThreePointArc((24.0550270054, 18.3981727559), (21.4142135624, 21.4142135624), (18.3981727559, 24.0550270054))
            Line((18.3981727559, 24.0550270054), (4, 9.6568542495))
            Line((4, 9.6568542495), (4, 30.0189454343))
            ThreePointArc((4, 30.0189454343), (0, 30.2842712475), (-4, 30.0189454343))
            Line((-4, 30.0189454343), (-4, 9.6568542495))
            Line((-4, 9.6568542495), (-18.3981727559, 24.0550270054))
            ThreePointArc((-18.3981727559, 24.0550270054), (-21.4142135624, 21.4142135624), (-24.0550270054, 18.3981727559))
            Line((-24.0550270054, 18.3981727559), (-9.6568542495, 4))
            Line((-9.6568542495, 4), (-30.0189454343, 4))
            ThreePointArc((-30.0189454343, 4), (-30.2842712475, 0), (-30.0189454343, -4))
            Line((-30.0189454343, -4), (-9.6568542495, -4))
            Line((-9.6568542495, -4), (-24.0550270054, -18.3981727559))
            ThreePointArc((-24.0550270054, -18.3981727559), (-21.4142135624, -21.4142135624), (-18.3981727559, -24.0550270054))
            Line((-18.3981727559, -24.0550270054), (-4, -9.6568542495))
            Line((-4, -9.6568542495), (-4, -30.0189454343))
            ThreePointArc((-4, -30.0189454343), (0, -30.2842712475), (4, -30.0189454343))
            Line((4, -30.0189454343), (4, -9.6568542495))
            Line((4, -9.6568542495), (18.3981727559, -24.0550270054))
            ThreePointArc((18.3981727559, -24.0550270054), (21.4142135624, -21.4142135624), (24.0550270054, -18.3981727559))
            Line((24.0550270054, -18.3981727559), (9.6568542495, -4))
            Line((9.6568542495, -4), (30.0189454343, -4))
        make_face()
        Circle(F0_R, mode=Mode.SUBTRACT)
    extrude(amount=F2_DEPTH)


with BuildPart() as f3:
    # F0 (on Front) → F3 (new body)
    with BuildSketch(Plane.XZ):
        with Locations((-92.1364873648, 55.167786777)):
            Circle(F0_R_2)
    extrude(amount=F3_DEPTH)

    # F0 (on Front) → F4 (join)
    with BuildSketch(Plane.XZ):
        with Locations((-92.1364873648, 55.167786777)):
            Circle(F0_R_3)
        with Locations((-92.1364873648, 55.167786777)):
            Circle(F0_R_2, mode=Mode.SUBTRACT)
        with Locations((-92.1364873648, 55.167786777)):
            Circle(F0_R_2)
    extrude(amount=-F4_DEPTH)


solid = Compound([f1.part, f2.part, f3.part])
